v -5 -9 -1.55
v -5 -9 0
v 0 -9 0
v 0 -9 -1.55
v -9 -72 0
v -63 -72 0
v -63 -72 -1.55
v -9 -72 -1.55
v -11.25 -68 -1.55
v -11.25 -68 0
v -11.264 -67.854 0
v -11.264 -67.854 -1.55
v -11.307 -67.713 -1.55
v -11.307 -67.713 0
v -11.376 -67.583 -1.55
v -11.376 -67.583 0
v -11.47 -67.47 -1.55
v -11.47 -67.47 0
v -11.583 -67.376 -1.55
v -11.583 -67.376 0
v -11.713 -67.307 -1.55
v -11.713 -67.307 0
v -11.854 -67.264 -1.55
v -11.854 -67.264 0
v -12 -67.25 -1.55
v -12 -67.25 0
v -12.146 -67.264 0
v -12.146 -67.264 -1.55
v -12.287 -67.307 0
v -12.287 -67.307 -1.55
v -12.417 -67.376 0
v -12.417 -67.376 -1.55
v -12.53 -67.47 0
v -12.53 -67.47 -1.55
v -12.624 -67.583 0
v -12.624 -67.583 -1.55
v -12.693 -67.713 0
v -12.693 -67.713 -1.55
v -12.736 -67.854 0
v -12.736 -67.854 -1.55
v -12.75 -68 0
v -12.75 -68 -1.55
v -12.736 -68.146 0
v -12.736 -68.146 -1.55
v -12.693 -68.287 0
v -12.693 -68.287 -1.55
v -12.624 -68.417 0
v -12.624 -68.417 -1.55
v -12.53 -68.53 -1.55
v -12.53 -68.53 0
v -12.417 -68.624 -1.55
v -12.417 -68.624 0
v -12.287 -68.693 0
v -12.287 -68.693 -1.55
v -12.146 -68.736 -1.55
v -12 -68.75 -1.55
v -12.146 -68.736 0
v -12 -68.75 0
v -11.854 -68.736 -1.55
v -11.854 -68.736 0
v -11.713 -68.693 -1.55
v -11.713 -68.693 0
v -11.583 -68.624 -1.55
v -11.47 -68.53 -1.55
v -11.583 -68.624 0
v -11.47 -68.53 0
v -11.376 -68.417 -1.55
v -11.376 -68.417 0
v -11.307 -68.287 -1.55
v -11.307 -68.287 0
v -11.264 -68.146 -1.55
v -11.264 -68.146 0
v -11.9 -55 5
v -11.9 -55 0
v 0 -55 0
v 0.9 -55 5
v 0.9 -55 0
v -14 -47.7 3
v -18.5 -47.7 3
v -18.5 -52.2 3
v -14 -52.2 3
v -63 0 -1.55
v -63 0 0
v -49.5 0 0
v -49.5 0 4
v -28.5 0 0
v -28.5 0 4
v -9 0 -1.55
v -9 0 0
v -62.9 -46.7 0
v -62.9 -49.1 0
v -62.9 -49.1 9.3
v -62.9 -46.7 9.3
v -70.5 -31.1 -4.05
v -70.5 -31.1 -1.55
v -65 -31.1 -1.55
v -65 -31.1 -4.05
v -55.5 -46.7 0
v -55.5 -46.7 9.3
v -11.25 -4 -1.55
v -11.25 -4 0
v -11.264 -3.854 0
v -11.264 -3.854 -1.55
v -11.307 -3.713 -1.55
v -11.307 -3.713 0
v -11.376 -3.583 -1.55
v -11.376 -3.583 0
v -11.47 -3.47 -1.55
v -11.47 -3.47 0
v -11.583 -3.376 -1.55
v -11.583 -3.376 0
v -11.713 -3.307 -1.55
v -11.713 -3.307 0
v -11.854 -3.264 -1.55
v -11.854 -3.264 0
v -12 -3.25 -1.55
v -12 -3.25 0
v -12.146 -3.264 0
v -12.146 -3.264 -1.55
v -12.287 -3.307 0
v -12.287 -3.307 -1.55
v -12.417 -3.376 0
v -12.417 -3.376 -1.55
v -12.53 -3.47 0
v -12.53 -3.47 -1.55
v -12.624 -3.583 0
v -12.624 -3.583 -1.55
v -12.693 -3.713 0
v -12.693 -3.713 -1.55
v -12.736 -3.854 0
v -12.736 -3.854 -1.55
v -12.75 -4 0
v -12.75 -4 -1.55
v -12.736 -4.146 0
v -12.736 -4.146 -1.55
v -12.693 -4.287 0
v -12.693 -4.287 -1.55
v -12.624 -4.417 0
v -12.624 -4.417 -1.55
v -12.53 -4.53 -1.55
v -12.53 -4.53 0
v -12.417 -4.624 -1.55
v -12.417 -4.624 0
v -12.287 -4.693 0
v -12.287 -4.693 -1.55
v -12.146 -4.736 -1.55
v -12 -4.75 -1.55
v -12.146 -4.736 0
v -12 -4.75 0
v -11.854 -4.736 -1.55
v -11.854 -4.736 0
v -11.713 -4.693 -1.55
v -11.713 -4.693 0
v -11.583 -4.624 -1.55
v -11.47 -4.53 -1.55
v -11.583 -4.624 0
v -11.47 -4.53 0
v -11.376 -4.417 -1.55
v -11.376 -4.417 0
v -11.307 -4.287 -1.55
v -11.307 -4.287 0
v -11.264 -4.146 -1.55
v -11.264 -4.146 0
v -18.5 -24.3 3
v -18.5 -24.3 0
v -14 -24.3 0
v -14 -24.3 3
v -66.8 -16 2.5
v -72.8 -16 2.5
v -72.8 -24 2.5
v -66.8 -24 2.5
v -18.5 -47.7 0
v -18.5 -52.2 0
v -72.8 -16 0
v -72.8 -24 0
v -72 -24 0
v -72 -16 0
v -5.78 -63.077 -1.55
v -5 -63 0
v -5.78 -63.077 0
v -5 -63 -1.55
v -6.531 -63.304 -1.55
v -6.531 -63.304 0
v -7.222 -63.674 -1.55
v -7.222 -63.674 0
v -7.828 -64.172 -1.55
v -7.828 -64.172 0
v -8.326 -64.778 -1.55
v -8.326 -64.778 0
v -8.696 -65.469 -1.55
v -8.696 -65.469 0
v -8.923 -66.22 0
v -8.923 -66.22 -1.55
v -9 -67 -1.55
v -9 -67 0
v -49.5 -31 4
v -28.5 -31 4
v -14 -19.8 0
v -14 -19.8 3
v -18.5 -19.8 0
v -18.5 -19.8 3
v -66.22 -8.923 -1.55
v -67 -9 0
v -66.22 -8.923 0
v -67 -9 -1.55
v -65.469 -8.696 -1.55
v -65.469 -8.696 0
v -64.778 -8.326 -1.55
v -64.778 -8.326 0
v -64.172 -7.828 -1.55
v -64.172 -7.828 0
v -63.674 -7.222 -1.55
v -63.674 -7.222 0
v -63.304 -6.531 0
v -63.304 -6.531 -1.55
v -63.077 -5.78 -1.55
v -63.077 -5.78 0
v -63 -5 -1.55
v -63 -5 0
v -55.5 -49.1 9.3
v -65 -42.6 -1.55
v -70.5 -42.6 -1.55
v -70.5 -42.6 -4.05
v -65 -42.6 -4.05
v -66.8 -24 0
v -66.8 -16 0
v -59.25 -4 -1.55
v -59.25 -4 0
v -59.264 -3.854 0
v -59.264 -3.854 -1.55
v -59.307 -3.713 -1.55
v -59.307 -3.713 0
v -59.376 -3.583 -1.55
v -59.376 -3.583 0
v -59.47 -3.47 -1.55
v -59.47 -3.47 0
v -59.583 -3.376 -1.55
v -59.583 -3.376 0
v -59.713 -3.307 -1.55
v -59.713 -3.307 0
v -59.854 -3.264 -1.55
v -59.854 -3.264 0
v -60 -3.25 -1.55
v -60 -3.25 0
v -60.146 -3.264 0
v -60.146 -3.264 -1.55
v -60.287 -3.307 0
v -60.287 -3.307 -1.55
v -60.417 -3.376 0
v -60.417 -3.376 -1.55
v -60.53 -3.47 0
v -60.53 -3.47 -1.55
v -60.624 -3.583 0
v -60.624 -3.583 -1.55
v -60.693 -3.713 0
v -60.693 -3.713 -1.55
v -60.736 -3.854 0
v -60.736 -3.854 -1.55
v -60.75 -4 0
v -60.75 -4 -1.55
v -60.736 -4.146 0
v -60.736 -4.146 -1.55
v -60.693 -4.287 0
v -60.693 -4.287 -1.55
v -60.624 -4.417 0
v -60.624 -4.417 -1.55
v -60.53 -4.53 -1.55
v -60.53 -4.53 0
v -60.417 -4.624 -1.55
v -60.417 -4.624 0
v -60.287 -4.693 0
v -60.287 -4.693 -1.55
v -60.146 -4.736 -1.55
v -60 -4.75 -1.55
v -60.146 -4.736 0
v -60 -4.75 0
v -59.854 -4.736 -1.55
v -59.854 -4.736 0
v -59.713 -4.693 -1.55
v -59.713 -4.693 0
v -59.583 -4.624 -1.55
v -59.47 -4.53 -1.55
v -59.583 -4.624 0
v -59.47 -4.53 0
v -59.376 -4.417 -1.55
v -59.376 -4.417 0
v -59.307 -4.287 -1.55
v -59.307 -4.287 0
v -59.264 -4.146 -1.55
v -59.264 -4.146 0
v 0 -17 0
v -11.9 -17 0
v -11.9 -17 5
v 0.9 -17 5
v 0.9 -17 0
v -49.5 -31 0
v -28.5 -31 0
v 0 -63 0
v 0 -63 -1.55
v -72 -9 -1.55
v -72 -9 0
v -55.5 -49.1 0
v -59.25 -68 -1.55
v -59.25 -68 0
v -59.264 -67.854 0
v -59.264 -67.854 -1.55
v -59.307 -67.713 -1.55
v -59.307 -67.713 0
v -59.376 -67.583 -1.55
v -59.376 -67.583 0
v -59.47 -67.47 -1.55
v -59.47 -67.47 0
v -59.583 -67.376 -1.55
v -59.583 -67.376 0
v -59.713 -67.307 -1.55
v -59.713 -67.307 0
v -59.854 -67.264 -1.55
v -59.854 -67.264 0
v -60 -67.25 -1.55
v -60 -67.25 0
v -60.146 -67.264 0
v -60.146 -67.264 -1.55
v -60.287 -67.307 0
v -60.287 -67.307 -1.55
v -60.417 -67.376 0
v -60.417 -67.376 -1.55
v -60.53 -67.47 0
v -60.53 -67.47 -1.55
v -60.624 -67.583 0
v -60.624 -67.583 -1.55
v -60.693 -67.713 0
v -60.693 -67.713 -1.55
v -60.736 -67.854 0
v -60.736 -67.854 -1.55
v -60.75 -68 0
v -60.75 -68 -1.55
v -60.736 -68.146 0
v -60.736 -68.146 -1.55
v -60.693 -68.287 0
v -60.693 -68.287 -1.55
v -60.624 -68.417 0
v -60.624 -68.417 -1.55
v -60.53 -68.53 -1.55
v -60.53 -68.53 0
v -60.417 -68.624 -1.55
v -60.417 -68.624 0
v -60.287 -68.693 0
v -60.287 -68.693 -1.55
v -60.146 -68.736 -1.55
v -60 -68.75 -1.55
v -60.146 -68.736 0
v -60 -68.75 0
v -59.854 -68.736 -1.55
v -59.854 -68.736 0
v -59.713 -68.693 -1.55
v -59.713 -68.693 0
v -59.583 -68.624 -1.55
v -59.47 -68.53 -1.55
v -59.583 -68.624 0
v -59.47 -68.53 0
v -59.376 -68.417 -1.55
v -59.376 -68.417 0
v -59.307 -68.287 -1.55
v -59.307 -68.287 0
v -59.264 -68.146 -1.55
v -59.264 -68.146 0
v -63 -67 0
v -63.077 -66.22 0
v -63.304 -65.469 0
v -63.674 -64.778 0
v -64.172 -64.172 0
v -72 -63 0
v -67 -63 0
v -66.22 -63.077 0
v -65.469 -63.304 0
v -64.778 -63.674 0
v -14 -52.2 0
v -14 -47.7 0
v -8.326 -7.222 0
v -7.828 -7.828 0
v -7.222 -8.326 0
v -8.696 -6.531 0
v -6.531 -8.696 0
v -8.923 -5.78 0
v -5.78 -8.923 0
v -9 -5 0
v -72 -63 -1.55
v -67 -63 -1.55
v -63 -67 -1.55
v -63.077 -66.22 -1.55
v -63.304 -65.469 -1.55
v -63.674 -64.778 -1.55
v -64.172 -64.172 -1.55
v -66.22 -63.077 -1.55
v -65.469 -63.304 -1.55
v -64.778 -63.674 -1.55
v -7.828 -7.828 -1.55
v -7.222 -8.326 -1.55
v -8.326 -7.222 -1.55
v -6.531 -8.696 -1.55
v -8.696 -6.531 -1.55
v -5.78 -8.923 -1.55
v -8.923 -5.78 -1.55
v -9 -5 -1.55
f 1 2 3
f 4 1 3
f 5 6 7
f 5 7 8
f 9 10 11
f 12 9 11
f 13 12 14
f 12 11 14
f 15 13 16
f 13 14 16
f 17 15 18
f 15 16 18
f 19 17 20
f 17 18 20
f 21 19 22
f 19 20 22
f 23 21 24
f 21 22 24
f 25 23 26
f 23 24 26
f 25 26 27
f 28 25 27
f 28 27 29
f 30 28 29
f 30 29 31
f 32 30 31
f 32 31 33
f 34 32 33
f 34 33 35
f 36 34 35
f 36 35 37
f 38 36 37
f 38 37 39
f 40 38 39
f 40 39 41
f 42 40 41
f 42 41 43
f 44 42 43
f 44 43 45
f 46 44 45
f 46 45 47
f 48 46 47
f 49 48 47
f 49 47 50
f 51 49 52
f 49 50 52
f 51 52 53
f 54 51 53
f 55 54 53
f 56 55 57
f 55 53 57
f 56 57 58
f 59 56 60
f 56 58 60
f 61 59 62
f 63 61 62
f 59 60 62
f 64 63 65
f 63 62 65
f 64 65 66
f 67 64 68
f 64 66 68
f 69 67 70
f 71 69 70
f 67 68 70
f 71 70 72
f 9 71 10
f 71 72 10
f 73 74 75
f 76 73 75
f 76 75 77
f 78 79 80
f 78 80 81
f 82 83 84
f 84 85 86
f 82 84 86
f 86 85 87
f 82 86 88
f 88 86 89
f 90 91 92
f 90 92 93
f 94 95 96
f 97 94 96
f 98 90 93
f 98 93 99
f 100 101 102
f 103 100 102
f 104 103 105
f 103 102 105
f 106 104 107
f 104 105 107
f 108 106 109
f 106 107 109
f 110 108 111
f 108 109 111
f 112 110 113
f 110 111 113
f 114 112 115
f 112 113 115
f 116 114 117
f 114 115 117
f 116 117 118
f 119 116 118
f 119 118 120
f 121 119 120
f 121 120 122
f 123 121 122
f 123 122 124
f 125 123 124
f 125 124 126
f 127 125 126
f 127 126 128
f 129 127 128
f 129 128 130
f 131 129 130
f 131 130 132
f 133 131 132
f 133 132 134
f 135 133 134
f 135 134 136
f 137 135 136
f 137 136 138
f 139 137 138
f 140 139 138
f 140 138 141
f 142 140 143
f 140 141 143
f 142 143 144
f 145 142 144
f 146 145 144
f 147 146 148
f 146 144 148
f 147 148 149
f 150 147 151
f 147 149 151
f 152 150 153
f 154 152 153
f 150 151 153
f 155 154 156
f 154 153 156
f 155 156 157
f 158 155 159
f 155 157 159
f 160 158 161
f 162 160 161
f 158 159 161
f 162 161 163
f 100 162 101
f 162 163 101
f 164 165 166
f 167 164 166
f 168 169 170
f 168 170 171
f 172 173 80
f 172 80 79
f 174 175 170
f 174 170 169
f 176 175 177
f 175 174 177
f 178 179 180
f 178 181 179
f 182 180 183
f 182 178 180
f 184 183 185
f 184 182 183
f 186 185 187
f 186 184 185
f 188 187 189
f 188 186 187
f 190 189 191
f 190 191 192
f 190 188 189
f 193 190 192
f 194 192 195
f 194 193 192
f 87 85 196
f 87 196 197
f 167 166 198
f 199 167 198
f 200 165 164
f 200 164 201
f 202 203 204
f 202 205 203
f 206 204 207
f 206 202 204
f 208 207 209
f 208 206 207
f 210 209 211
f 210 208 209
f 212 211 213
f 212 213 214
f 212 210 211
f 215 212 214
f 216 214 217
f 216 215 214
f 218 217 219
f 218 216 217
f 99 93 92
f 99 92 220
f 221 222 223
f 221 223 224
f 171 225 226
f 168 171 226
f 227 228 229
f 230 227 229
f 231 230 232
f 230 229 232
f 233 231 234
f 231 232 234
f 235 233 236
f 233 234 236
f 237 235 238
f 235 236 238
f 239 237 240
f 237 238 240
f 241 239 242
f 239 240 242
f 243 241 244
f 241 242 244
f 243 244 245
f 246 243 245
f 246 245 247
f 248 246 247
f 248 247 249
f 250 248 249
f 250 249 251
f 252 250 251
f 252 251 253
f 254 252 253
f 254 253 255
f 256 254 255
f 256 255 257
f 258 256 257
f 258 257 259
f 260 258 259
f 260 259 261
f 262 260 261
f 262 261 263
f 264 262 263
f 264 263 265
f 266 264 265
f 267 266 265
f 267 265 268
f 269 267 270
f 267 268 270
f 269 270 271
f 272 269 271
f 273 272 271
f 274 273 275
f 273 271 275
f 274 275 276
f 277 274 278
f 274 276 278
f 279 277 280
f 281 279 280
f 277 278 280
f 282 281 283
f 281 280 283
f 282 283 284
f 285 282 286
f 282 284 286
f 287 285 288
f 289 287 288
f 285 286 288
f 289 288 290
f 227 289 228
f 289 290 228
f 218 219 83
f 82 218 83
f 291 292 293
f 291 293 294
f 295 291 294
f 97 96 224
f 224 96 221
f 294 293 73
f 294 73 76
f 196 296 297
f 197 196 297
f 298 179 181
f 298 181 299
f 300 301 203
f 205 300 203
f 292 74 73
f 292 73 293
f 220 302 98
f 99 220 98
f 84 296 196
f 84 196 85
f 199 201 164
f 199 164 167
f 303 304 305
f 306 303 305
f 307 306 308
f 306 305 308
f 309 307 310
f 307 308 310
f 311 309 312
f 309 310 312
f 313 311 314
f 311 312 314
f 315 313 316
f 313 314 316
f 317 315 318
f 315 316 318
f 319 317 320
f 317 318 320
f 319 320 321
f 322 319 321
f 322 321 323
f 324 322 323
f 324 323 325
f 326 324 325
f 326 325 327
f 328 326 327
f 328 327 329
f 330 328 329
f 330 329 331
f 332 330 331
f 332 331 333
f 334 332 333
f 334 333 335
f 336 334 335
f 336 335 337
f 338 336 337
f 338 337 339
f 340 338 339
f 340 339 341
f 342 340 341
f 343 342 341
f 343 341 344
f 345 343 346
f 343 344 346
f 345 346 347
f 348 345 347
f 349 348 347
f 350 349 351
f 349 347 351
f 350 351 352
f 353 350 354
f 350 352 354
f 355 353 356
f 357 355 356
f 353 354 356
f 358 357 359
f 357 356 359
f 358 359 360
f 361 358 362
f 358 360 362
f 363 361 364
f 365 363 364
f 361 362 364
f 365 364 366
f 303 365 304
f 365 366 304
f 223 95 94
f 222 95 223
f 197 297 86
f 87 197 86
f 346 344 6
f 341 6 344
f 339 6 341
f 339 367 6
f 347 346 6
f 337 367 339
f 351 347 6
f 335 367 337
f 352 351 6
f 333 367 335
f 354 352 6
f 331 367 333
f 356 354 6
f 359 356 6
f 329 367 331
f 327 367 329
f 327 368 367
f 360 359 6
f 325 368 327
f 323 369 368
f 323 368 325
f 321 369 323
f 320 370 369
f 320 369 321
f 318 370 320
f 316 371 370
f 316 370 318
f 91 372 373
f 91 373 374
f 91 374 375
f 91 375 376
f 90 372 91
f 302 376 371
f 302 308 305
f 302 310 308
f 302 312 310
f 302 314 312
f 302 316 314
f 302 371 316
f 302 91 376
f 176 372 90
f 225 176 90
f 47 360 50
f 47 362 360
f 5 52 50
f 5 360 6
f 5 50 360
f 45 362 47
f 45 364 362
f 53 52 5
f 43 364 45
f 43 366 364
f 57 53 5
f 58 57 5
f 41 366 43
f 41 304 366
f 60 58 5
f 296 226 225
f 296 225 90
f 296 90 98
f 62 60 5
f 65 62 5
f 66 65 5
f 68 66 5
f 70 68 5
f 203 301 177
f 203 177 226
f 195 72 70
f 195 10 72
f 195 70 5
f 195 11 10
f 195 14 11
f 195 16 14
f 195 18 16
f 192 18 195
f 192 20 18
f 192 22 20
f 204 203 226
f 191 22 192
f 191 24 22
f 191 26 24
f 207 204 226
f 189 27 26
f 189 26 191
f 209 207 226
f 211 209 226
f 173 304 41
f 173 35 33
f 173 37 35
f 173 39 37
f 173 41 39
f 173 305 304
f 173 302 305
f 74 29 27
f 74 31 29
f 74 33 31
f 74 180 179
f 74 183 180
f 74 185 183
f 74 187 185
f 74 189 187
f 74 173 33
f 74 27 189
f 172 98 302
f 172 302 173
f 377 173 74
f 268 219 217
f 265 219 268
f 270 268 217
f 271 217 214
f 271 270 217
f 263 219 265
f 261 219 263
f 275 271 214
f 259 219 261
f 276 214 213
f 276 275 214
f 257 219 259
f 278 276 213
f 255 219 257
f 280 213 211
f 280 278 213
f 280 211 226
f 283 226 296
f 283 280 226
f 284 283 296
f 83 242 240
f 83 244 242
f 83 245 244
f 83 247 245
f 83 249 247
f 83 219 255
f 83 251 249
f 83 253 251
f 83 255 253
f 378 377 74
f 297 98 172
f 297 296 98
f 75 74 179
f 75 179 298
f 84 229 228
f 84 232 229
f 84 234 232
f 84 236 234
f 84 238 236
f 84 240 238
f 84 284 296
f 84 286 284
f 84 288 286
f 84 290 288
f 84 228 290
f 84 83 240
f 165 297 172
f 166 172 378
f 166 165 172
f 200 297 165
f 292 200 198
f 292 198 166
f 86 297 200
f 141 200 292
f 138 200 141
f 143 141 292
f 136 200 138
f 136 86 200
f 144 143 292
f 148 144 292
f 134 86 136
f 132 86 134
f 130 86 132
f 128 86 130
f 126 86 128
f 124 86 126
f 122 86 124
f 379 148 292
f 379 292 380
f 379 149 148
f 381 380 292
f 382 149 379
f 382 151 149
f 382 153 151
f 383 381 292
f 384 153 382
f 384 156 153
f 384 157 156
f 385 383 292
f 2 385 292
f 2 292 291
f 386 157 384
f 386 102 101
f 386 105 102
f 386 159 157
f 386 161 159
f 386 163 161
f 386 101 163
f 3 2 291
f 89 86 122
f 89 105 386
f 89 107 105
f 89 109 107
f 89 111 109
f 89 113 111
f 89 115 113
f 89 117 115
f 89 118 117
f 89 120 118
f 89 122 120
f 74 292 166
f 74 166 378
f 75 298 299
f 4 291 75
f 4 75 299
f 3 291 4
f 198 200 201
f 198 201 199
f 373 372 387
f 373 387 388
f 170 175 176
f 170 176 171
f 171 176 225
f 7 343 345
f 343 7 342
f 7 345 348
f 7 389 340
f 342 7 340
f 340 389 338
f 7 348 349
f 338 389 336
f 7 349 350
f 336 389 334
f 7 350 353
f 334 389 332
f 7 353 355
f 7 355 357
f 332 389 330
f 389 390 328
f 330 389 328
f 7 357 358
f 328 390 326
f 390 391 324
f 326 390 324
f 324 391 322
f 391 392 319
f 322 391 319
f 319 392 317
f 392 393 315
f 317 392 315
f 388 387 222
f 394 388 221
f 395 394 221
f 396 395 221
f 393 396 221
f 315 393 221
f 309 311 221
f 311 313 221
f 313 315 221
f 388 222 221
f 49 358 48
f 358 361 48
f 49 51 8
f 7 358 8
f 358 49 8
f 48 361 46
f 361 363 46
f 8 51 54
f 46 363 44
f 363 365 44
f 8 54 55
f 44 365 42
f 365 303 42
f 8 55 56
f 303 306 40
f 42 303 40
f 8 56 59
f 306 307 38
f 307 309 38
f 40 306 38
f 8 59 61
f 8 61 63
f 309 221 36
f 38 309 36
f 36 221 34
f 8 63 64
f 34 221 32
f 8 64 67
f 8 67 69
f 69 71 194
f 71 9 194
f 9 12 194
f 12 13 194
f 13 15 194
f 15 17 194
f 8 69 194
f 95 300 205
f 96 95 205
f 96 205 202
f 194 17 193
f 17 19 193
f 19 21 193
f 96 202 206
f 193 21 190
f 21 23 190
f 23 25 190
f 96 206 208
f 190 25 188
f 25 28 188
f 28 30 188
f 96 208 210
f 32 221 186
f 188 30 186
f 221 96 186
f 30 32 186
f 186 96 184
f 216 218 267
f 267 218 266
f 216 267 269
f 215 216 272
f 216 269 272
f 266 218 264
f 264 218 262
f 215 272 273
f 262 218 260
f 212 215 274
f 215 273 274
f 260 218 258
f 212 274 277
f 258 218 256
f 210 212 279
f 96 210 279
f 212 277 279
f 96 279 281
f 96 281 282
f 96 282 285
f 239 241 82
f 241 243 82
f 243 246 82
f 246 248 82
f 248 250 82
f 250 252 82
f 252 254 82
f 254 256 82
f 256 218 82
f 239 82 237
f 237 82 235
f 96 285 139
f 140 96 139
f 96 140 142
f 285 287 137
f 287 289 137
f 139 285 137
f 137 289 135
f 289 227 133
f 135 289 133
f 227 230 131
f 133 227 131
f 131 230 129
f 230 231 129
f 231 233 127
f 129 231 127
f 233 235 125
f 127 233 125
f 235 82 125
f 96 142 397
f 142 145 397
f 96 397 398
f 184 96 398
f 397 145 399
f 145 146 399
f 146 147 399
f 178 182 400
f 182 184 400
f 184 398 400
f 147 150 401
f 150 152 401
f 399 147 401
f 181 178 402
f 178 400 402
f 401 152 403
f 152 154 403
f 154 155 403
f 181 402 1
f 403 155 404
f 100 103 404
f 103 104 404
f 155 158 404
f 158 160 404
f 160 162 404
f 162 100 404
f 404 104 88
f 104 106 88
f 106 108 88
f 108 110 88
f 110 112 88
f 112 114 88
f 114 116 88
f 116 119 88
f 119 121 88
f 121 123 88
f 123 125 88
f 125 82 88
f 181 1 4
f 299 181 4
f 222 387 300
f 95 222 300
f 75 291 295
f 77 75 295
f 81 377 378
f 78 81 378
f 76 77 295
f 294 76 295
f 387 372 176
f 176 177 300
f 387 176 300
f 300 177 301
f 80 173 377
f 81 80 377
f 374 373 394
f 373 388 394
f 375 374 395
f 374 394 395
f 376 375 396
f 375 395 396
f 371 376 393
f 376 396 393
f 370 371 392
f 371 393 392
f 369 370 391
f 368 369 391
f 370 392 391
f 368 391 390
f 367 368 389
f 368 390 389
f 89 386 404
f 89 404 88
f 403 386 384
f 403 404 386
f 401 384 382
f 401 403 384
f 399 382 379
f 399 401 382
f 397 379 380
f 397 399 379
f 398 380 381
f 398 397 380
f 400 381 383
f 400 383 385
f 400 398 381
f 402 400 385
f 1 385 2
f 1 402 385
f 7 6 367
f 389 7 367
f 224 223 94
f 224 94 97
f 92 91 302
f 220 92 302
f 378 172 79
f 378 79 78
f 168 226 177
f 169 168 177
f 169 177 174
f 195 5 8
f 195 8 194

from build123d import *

# Parameters (mm, degrees)
F0_W      = 72
F0_H      = 72
F1_DEPTH  = 1.55
F2_W      = 9
F2_H      = 9
F3_DEPTH  = 1.551
F4_R      = 4
F5_W      = 21
F5_H      = 31
F6_DEPTH  = 4
F7_W      = 5.2
F7_H      = 8
F7_W_2    = 0.8
F8_DEPTH  = 2.5
F9_W      = 12.8
F9_H      = 38
F10_DEPTH = 5
F11_W     = 5.5
F11_H     = 11.5
F12_DEPTH = 2.5
F13_R     = 0.75
F14_DEPTH = 4.051
F15_W     = 4.5
F15_H     = 4.5
F16_DEPTH = 3
F17_W     = 7.4
F17_H     = 2.4
F18_DEPTH = 9.3


with BuildPart() as f1:
    # F0 (on Top) → F1 (new body)
    with BuildSketch(Plane.XY):
        with Locations((-36, -36)):
            Rectangle(F0_W, F0_H)
    extrude(amount=-F1_DEPTH)

    # F2 (on face) → F3 (cut, through all)
    with BuildSketch(Plane.XY):
        with Locations((-67.5, -67.5)):
            Rectangle(F2_W, F2_H)
        with Locations((-67.5, -4.5)):
            Rectangle(F2_W, F2_H)
        with Locations((-4.5, -4.5)):
            Rectangle(F2_W, F2_H)
        with Locations((-4.5, -67.5)):
            Rectangle(F2_W, F2_H)
    extrude(amount=-F3_DEPTH, mode=Mode.SUBTRACT)

    # F4
    f4_edges = [f1.edges().sort_by_distance(p)[0] for p in [
        (-9, -63, -0.775),
        (-63, -63, -0.775),
        (-63, -9, -0.775),
        (-9, -9, -0.775),
    ]]
    fillet(f4_edges, radius=F4_R)

    # F5 (on face) → F6 (join)
    with BuildSketch(Plane.XY):
        with Locations((-39, -15.5)):
            Rectangle(F5_W, F5_H)
    extrude(amount=F6_DEPTH)

    # F7 (on face) → F8 (join)
    with BuildSketch(Plane.XY):
        with Locations((-69.4, -20)):
            Rectangle(F7_W, F7_H)
        with Locations((-72.4, -20)):
            Rectangle(F7_W_2, F7_H)
    extrude(amount=F8_DEPTH)

    # F9 (on face) → F10 (join)
    with BuildSketch(Plane.XY):
        with Locations((-5.5, -36)):
            Rectangle(F9_W, F9_H)
    extrude(amount=F10_DEPTH)

    # F11 (on face) → F12 (join)
    with BuildSketch(Plane(origin=(0, 0, -1.55), x_dir=(1, 0, 0), z_dir=(0, 0, -1))):
        with Locations((-67.75, 36.85)):
            Rectangle(F11_W, F11_H)
    extrude(amount=F12_DEPTH)

    # F13 (on face) → F14 (cut, through all)
    with BuildSketch(Plane.XY):
        with Locations((-60, -4)):
            Circle(F13_R)
        with Locations((-12, -4)):
            Circle(F13_R)
        with Locations((-12, -68)):
            Circle(F13_R)
        with Locations((-60, -68)):
            Circle(F13_R)
    extrude(amount=-F14_DEPTH, mode=Mode.SUBTRACT)

    # F15 (on face) → F16 (join)
    with BuildSketch(Plane.XY):
        with Locations((-16.25, -22.05)):
            Rectangle(F15_W, F15_H)
        with Locations((-16.25, -49.95)):
            Rectangle(F15_W, F15_H)
    extrude(amount=F16_DEPTH)

    # F17 (on face) → F18 (join)
    with BuildSketch(Plane.XY):
        with Locations((-59.2, -47.9)):
            Rectangle(F17_W, F17_H)
    extrude(amount=F18_DEPTH)


solid = f1.part
